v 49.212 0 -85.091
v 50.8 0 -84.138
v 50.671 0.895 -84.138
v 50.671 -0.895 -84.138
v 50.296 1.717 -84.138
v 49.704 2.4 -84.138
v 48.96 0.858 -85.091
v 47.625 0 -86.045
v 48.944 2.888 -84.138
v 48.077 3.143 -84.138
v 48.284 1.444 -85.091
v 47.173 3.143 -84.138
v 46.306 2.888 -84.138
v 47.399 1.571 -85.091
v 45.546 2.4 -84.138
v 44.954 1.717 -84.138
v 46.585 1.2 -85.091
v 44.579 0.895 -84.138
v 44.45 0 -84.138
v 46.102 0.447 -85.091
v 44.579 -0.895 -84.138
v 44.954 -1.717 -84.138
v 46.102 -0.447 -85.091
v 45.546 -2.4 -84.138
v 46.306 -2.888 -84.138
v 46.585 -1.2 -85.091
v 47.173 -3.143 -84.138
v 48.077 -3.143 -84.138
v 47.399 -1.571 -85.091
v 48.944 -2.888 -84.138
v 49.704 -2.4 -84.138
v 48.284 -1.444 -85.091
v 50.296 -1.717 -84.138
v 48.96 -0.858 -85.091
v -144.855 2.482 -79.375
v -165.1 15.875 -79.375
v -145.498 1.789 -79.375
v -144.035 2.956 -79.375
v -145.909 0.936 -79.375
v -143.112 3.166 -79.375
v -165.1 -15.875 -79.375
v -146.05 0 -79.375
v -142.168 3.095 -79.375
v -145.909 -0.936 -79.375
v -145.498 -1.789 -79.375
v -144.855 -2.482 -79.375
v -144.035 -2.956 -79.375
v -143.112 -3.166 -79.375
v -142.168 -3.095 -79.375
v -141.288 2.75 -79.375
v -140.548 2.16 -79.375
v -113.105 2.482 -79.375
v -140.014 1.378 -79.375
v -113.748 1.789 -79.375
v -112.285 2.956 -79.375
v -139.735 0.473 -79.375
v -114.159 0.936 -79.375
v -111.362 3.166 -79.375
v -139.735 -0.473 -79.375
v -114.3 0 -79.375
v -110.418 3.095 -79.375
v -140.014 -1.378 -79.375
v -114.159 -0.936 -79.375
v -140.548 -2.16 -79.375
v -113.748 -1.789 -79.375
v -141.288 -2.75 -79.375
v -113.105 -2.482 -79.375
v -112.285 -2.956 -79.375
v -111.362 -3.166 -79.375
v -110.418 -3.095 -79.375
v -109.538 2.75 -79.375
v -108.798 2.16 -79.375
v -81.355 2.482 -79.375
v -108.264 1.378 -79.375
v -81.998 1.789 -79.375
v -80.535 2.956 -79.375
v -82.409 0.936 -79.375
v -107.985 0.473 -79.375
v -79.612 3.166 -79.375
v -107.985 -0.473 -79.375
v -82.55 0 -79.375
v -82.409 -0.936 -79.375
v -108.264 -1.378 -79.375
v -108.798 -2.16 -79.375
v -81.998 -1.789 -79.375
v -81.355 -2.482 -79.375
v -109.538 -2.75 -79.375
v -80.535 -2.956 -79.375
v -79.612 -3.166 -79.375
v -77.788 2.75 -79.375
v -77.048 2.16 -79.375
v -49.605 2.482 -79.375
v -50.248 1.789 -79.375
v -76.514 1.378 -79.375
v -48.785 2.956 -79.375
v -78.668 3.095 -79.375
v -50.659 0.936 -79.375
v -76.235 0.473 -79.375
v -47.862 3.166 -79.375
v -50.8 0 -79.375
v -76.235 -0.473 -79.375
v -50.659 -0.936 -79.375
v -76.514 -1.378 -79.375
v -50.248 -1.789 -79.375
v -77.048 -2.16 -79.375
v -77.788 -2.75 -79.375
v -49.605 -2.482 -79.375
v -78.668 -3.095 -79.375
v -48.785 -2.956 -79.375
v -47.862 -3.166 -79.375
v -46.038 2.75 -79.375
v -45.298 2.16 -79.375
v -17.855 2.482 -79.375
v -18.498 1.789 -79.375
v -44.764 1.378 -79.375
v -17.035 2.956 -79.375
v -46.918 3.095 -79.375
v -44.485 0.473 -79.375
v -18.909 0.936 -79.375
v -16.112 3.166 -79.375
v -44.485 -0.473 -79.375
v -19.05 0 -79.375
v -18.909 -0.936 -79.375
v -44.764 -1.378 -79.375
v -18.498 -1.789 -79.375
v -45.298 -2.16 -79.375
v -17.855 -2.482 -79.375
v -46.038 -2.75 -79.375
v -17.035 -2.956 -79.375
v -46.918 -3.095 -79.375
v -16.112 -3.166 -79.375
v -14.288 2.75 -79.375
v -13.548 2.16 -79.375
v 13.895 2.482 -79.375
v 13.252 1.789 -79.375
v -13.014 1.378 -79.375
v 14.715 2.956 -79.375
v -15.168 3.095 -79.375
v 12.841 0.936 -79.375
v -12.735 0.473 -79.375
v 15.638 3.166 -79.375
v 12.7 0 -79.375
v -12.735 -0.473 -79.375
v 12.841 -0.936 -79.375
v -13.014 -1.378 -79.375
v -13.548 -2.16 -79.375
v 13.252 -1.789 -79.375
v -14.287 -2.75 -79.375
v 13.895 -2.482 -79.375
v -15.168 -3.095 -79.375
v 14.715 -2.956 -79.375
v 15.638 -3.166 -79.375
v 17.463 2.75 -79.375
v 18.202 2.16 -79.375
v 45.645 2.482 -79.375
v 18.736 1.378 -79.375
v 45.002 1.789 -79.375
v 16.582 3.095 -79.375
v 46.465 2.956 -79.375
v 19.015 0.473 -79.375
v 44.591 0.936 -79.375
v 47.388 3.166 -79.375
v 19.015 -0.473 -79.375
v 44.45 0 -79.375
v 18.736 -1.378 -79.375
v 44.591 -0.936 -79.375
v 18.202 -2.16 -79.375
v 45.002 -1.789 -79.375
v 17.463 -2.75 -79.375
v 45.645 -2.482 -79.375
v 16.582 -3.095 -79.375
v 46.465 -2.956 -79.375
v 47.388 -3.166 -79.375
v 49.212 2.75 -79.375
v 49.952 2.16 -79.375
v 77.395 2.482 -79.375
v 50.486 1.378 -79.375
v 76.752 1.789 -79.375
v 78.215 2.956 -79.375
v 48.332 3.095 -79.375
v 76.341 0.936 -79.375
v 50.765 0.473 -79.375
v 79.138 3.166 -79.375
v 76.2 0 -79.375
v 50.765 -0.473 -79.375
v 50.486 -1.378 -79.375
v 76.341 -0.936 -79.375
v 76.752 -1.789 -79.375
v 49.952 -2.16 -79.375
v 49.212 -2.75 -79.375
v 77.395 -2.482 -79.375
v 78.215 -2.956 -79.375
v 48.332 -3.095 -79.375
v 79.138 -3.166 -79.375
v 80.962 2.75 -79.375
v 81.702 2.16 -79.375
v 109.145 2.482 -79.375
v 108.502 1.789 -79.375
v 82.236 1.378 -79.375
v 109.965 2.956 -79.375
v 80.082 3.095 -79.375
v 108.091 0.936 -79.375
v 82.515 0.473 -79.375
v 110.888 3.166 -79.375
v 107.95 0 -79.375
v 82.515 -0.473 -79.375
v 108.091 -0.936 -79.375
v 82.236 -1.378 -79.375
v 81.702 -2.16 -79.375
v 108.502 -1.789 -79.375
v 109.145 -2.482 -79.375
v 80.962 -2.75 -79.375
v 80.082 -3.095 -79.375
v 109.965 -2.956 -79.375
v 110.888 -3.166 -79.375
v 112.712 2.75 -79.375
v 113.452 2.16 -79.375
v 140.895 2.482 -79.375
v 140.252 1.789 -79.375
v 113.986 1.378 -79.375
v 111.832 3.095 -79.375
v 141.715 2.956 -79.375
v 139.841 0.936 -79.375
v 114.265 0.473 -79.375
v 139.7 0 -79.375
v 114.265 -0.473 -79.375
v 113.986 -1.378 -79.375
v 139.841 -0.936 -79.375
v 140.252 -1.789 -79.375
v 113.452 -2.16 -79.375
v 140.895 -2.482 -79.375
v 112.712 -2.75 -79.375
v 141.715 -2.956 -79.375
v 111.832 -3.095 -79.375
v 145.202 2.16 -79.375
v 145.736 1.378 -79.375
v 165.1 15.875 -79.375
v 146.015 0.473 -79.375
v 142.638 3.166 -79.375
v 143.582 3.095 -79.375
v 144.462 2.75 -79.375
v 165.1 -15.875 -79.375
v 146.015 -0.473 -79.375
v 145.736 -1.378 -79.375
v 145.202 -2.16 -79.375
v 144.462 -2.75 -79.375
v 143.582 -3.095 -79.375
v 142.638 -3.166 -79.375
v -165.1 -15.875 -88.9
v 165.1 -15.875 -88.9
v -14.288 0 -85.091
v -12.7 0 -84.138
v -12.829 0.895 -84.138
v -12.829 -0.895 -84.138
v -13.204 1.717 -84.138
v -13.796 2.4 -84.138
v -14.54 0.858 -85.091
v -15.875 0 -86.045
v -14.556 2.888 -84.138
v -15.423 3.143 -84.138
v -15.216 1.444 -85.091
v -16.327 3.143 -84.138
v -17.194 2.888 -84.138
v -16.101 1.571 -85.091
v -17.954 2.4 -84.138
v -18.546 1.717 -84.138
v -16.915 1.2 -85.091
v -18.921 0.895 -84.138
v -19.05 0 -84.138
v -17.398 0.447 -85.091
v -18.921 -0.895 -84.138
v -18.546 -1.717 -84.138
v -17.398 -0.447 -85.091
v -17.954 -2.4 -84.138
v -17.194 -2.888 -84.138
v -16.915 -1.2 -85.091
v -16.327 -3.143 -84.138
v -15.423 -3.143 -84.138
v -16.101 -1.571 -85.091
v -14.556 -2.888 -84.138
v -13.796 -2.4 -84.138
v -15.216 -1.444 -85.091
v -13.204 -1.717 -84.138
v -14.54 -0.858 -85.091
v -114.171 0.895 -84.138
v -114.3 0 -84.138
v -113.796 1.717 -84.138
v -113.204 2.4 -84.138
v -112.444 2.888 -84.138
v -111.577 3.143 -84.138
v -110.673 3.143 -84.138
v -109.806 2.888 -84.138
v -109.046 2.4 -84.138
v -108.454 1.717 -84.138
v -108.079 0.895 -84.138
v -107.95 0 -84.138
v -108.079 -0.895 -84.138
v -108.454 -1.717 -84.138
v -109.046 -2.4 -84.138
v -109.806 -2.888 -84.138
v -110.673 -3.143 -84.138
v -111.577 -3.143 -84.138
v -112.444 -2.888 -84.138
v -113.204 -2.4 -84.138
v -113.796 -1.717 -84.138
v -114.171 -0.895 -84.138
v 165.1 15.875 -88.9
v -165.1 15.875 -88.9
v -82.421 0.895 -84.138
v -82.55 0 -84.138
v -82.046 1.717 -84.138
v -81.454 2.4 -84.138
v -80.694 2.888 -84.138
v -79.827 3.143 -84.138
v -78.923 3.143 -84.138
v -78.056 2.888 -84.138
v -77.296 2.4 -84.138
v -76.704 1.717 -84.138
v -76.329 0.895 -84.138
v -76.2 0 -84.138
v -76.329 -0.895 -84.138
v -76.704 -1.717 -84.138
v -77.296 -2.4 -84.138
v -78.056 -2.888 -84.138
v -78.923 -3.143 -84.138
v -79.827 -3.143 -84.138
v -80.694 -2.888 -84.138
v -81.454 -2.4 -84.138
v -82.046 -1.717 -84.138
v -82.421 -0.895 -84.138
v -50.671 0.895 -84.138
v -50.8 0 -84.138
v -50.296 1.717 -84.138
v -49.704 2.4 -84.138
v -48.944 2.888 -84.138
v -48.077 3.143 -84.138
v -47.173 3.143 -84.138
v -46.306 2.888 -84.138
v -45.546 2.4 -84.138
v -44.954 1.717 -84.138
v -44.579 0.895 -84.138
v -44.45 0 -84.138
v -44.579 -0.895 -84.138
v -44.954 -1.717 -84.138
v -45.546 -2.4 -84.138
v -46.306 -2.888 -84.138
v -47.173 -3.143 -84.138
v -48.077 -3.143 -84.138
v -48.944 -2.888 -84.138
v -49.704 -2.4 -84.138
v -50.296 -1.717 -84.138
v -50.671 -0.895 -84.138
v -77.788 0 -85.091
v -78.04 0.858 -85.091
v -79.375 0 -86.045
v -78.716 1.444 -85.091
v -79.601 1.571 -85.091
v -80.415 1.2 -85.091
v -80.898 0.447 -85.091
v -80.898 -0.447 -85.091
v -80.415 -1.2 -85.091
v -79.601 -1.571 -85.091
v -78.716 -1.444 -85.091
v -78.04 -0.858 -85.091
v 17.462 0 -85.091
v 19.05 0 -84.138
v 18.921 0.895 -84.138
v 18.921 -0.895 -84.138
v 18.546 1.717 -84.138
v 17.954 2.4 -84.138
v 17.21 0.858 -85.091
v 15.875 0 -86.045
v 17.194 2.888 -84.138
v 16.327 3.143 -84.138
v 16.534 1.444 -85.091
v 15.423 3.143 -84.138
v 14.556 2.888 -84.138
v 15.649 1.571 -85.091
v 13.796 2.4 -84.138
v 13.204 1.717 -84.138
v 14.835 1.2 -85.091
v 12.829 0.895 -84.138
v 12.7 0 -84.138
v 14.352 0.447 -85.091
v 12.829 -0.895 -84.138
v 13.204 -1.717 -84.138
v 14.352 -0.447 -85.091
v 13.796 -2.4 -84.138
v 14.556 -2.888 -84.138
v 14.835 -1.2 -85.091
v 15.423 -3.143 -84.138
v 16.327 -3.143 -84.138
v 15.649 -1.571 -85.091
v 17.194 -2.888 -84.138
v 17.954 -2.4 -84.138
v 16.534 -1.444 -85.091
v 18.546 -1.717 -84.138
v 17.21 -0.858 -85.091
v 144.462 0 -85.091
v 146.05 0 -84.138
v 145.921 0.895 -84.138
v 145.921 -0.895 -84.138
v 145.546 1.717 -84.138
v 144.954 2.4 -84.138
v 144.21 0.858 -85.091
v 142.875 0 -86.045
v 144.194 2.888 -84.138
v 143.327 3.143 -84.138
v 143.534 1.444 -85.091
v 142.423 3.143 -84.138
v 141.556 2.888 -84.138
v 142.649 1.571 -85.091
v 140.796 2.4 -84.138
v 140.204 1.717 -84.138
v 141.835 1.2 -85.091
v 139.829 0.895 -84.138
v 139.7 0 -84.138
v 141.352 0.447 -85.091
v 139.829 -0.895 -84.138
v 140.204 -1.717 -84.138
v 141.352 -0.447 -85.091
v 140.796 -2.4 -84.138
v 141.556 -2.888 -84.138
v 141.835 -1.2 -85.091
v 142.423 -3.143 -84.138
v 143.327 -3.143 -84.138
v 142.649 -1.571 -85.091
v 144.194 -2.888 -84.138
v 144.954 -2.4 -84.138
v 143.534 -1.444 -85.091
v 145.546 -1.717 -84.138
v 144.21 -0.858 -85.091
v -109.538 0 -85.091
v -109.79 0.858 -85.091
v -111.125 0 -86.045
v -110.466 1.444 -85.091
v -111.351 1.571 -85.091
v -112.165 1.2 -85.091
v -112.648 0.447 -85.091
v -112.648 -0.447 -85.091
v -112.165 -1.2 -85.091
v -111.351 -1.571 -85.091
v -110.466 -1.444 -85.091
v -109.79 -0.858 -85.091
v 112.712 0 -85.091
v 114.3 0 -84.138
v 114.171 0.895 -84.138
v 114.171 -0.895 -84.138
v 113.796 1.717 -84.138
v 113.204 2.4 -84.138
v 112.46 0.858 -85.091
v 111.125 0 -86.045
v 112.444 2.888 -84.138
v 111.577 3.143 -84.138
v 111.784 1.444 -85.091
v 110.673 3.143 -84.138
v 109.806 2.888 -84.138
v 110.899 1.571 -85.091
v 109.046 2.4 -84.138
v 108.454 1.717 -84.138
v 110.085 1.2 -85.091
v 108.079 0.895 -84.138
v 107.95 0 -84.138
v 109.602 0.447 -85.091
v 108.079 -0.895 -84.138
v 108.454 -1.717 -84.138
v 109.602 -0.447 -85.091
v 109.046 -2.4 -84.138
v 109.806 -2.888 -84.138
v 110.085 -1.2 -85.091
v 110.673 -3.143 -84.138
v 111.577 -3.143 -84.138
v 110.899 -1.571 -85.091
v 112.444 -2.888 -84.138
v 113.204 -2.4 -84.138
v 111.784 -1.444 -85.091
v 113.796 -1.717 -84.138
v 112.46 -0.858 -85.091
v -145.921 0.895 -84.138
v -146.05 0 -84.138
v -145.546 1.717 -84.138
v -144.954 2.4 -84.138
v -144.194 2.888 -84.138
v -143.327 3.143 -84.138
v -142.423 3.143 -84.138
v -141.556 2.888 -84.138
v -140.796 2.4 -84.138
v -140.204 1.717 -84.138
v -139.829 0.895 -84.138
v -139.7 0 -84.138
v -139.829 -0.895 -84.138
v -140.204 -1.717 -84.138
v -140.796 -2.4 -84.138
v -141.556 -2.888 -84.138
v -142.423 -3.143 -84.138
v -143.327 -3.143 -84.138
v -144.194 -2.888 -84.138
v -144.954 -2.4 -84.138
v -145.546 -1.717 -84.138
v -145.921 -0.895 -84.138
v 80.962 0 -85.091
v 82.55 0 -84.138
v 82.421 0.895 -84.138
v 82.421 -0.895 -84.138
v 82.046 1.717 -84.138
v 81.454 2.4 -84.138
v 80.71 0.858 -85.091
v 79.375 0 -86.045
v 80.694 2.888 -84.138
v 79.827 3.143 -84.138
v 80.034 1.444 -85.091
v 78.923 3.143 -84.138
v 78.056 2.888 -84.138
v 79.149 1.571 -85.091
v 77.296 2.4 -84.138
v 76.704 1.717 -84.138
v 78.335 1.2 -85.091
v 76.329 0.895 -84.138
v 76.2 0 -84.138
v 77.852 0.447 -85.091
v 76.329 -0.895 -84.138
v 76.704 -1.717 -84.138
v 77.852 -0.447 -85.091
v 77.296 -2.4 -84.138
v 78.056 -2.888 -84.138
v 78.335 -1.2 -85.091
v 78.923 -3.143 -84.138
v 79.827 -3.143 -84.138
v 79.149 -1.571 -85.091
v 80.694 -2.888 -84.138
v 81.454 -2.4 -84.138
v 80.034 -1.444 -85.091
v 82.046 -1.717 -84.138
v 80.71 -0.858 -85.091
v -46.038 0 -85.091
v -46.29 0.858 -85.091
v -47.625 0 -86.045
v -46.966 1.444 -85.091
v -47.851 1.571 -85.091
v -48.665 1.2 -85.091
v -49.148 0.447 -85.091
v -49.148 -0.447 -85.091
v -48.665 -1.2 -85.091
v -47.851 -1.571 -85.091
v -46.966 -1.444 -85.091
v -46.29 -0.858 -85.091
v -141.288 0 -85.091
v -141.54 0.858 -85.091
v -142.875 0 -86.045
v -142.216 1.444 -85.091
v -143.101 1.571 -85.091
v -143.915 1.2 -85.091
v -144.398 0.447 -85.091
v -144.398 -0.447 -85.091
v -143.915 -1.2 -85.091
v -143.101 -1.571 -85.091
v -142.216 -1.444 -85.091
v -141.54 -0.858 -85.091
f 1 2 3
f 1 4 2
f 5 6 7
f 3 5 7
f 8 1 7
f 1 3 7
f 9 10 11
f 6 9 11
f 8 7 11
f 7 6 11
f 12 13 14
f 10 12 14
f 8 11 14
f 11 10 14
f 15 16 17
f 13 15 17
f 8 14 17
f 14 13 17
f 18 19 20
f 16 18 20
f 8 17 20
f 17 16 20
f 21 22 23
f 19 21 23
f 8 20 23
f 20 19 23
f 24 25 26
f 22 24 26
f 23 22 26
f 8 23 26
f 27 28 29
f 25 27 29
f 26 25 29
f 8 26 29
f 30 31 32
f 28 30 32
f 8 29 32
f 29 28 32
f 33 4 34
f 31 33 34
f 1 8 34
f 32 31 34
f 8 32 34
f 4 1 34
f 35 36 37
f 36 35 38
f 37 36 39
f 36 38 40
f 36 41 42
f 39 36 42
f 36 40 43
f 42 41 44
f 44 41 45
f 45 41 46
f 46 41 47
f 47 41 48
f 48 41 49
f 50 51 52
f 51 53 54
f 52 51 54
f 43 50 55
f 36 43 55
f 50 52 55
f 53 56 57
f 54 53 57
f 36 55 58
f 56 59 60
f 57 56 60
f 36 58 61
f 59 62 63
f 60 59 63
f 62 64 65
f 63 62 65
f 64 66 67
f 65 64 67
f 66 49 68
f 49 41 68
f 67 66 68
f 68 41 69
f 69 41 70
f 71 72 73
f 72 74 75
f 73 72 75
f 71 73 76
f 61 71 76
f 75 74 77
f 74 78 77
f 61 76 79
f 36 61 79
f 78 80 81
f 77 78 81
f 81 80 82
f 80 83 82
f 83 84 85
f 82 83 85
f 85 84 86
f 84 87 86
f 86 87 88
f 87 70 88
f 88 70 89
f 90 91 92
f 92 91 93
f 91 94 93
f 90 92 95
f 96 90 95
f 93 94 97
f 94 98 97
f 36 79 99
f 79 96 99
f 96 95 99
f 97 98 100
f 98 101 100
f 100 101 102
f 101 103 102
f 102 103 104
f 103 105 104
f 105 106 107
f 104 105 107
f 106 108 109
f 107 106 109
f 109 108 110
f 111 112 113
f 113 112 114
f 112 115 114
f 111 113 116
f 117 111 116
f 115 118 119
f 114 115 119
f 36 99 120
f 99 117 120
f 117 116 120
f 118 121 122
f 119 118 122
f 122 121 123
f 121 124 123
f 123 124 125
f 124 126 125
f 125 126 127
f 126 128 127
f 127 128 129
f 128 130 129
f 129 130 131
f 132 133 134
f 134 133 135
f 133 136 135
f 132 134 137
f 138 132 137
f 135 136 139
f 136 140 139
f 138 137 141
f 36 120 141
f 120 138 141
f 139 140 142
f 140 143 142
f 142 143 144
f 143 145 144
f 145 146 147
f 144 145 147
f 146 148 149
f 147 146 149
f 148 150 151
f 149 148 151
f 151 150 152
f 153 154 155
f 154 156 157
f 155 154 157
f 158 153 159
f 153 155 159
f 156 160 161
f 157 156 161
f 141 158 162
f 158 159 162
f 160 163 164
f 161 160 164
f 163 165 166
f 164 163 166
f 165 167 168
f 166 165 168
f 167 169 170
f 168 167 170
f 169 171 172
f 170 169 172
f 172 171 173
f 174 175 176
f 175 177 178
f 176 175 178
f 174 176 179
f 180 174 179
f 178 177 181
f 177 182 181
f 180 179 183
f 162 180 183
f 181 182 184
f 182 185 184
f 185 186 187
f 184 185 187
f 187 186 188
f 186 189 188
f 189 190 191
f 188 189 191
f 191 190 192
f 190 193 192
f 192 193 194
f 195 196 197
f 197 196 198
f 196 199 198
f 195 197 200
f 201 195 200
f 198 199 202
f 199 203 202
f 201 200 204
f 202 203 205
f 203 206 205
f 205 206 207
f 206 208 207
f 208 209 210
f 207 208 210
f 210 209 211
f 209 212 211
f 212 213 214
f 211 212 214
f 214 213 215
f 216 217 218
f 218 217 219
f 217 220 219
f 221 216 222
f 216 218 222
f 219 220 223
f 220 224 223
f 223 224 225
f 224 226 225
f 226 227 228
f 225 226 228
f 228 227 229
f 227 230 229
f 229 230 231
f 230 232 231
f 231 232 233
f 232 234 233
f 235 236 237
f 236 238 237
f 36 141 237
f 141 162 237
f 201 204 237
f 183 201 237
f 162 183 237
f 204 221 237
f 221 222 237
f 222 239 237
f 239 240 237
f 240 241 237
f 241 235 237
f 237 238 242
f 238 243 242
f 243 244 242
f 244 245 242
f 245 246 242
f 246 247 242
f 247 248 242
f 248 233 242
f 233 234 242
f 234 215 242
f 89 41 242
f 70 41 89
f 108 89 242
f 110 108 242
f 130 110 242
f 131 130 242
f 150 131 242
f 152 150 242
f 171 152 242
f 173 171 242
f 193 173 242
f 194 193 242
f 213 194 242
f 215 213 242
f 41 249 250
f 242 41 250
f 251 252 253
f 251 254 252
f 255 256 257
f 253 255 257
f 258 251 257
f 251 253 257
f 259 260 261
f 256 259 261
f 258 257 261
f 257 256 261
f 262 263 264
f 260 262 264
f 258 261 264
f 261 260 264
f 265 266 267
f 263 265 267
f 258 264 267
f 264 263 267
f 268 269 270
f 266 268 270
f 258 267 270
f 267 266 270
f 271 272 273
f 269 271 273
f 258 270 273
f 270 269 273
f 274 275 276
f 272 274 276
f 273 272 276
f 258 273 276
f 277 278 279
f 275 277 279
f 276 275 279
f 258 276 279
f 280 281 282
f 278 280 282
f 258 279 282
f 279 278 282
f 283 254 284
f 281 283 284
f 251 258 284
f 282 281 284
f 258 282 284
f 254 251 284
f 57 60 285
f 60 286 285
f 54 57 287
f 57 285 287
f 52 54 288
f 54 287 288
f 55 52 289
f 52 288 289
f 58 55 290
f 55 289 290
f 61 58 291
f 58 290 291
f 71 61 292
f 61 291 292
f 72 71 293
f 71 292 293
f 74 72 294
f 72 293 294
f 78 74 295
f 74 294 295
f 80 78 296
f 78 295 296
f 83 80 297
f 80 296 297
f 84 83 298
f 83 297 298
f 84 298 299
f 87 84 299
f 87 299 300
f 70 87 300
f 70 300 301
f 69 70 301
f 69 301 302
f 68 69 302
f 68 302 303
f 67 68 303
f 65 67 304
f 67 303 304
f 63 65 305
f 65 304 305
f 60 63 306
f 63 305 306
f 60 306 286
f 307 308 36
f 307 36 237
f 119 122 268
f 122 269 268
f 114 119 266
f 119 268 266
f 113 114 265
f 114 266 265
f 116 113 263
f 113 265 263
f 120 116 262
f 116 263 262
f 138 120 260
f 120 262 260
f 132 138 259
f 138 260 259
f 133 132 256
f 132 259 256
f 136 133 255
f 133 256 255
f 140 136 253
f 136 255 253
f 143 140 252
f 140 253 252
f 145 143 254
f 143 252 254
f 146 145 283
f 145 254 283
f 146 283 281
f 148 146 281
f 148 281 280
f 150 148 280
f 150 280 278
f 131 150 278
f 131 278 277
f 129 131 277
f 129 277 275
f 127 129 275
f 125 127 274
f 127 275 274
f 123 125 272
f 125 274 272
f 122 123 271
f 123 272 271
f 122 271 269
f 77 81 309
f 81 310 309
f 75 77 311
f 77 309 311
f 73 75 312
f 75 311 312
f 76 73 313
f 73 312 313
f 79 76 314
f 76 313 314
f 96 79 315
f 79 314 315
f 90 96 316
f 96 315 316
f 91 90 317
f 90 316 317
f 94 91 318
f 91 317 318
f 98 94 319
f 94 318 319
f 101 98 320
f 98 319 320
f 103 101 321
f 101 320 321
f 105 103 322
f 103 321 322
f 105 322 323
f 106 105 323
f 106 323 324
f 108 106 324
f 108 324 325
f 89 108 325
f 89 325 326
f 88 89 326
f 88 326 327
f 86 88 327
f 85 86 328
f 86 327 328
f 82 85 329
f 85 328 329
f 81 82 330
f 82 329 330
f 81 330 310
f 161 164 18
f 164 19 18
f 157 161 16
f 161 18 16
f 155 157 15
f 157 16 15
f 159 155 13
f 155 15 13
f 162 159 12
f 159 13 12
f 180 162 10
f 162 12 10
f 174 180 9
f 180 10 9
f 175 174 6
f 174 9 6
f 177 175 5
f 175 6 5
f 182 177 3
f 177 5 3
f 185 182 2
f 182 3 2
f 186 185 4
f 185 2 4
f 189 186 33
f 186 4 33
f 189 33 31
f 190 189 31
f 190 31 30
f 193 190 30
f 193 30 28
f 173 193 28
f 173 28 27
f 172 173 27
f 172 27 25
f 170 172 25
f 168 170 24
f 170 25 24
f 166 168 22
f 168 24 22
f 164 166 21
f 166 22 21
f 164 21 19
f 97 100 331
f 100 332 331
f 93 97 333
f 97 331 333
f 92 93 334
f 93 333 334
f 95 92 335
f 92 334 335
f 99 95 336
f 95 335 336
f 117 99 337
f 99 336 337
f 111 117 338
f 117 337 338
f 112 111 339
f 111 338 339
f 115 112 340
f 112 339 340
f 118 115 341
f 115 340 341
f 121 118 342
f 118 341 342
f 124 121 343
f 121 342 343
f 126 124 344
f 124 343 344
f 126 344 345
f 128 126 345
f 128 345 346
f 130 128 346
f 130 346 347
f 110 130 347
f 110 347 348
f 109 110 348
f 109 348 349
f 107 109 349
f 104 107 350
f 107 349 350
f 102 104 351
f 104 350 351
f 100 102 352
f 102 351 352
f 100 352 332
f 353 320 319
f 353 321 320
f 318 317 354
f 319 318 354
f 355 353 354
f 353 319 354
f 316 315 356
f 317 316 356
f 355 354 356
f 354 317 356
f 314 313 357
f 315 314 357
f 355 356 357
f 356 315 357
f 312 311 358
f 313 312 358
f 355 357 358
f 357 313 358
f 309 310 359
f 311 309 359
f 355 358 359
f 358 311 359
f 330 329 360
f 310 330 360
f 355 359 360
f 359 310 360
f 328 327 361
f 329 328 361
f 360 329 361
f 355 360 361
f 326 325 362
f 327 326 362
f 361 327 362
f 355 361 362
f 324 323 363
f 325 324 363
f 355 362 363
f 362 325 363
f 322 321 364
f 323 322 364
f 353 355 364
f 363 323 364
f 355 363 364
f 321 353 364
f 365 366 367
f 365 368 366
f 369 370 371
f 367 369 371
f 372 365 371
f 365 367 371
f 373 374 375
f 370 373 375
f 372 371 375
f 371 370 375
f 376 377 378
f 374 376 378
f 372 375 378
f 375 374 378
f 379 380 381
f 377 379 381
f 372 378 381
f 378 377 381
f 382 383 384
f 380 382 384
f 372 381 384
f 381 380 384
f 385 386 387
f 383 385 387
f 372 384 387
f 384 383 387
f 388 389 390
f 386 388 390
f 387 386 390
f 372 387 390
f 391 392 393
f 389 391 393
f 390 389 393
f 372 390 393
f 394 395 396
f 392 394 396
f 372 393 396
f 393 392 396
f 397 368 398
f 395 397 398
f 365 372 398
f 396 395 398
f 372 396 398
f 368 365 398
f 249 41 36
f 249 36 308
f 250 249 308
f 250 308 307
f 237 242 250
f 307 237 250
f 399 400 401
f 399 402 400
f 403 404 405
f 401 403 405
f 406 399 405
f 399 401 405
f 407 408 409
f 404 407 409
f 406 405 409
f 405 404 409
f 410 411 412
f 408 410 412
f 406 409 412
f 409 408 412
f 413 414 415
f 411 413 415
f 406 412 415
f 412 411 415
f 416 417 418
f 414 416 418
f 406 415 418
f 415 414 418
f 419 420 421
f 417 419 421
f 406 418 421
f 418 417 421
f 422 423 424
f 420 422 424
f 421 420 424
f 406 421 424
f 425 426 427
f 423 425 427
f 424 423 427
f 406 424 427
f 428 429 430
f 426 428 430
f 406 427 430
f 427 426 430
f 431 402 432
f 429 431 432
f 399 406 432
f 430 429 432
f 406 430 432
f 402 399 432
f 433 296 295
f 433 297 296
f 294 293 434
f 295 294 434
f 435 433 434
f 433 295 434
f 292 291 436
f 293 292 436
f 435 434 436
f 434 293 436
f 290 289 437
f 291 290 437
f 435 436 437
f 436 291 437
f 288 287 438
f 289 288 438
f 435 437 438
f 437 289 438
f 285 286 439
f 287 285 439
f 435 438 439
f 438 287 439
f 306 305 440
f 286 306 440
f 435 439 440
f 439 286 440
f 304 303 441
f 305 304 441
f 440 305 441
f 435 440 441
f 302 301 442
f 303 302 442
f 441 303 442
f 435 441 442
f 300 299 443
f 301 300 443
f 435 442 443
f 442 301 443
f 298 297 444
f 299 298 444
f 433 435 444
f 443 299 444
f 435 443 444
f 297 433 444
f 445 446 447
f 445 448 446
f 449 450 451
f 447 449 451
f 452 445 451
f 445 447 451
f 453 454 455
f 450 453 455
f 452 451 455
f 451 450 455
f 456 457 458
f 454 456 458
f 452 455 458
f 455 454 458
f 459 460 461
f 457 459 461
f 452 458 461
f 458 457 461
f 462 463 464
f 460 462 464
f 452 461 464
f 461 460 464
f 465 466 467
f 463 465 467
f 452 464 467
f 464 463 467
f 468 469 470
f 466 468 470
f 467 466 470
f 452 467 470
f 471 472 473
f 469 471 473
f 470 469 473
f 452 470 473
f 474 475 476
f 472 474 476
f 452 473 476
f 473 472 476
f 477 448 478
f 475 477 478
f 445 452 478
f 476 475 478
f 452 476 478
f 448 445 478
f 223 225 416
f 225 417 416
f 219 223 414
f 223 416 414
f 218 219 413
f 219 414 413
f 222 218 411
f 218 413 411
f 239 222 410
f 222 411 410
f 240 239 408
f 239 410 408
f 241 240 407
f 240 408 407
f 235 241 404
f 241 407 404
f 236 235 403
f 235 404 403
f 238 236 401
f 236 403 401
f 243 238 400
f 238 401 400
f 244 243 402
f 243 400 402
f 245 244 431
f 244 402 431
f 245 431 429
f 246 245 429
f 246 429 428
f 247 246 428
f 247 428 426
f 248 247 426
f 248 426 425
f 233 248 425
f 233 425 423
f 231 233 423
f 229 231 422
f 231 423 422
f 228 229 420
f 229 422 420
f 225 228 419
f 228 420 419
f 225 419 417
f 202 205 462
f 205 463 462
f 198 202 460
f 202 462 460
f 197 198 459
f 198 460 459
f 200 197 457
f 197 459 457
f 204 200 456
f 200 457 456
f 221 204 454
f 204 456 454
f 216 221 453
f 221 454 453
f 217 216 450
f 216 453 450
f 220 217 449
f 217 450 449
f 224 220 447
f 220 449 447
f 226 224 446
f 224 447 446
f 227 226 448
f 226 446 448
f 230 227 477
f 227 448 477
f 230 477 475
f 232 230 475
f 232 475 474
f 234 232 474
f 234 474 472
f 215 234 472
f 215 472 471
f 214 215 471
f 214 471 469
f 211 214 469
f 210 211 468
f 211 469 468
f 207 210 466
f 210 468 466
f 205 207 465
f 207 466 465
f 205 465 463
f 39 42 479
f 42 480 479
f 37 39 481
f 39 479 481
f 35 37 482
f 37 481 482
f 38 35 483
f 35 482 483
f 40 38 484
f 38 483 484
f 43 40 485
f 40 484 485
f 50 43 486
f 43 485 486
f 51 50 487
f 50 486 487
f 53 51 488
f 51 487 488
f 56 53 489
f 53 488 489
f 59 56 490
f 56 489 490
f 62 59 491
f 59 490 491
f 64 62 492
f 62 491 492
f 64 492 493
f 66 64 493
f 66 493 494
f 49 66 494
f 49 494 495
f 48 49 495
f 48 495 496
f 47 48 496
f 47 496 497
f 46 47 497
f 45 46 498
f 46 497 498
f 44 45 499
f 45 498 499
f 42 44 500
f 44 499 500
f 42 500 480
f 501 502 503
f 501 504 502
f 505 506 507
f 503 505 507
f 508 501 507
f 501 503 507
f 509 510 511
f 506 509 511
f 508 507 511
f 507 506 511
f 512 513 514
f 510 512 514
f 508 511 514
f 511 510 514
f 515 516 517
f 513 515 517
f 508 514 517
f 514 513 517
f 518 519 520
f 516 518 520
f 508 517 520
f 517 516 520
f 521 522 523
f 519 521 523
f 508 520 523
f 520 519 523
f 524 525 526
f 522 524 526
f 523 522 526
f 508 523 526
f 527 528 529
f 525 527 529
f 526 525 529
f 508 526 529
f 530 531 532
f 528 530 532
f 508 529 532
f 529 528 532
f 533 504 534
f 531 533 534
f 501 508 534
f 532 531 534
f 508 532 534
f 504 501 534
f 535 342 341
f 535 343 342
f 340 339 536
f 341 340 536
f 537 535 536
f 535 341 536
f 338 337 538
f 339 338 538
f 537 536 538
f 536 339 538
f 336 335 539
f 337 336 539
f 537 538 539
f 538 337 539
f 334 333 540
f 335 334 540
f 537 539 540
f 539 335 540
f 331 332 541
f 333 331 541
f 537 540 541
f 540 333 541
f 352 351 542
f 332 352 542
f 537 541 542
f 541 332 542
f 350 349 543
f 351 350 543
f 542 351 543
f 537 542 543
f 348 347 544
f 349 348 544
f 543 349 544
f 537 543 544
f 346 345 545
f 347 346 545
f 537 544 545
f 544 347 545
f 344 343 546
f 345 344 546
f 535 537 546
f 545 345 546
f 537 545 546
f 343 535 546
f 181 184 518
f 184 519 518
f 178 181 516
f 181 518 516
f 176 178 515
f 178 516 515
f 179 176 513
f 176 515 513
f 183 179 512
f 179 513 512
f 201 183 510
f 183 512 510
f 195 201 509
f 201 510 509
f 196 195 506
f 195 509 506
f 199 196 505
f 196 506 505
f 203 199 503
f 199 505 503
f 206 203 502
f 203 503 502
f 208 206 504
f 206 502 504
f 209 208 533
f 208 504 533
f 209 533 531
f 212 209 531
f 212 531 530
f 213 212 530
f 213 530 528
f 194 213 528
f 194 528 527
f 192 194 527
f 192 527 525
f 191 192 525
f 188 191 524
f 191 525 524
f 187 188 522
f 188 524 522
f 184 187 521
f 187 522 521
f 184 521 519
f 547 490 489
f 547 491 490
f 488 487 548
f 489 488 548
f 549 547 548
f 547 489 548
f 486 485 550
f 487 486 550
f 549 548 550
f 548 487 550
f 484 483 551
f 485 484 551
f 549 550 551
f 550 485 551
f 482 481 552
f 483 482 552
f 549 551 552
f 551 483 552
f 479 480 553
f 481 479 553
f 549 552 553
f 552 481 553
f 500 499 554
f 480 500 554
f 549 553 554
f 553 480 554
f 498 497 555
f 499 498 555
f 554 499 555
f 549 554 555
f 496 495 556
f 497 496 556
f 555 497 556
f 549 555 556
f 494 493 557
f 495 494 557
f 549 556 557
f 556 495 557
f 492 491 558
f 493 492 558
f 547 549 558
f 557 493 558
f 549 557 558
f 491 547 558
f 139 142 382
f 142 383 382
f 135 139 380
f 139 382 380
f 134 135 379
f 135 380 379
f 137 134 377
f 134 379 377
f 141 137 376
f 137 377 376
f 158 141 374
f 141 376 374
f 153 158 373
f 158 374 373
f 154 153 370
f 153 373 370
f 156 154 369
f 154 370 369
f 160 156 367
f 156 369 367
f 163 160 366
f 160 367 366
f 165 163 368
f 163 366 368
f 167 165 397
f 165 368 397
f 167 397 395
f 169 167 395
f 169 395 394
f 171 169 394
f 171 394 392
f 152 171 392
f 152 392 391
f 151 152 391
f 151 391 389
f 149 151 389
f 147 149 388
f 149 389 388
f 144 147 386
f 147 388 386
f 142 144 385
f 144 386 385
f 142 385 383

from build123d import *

# Parameters (mm, degrees)
BOSS_EXTRUDE1_DEPTH             = 15.875
BOSS_EXTRUDE1_DEPTH_BACK        = 15.875
SKETCH2_W                       = 330.2
SKETCH2_H                       = 9.525
F_1_4_0_25_DIAMETER_HOLE1_D     = 6.35
F_1_4_0_25_DIAMETER_HOLE1_DEPTH = 4.7625
F_1_4_0_25_DIAMETER_HOLE1_TIP   = 1.907732465


with BuildPart() as part:
    # Sketch2 → Boss-Extrude1 (new, two sides: drawn at the far end of the back side and taken through both)
    with BuildSketch(Plane(origin=(0, 0, 0), x_dir=(1, 0, 0), z_dir=(0, 1, 0)).offset(-BOSS_EXTRUDE1_DEPTH_BACK)):
        with Locations((0, 84.1375)):
            Rectangle(SKETCH2_W, SKETCH2_H)
    extrude(amount=BOSS_EXTRUDE1_DEPTH + BOSS_EXTRUDE1_DEPTH_BACK)

    # 1/4 (0.25) Diameter Hole1
    with Locations(Plane.XY.offset(-79.375)):
        with Locations((-142.875, 0), (-111.125, 0), (-79.375, 0), (-47.625, 0), (-15.875, 0), (15.875, 0), (47.625, 0), (79.375, 0), (111.125, 0), (142.875, 0)):
            Hole(F_1_4_0_25_DIAMETER_HOLE1_D / 2, depth=F_1_4_0_25_DIAMETER_HOLE1_DEPTH)
            with Locations((0, 0, -(F_1_4_0_25_DIAMETER_HOLE1_DEPTH + F_1_4_0_25_DIAMETER_HOLE1_TIP / 2))):  # 118° drill point
                Cone(0, F_1_4_0_25_DIAMETER_HOLE1_D / 2, F_1_4_0_25_DIAMETER_HOLE1_TIP, mode=Mode.SUBTRACT)


solid = part.part
